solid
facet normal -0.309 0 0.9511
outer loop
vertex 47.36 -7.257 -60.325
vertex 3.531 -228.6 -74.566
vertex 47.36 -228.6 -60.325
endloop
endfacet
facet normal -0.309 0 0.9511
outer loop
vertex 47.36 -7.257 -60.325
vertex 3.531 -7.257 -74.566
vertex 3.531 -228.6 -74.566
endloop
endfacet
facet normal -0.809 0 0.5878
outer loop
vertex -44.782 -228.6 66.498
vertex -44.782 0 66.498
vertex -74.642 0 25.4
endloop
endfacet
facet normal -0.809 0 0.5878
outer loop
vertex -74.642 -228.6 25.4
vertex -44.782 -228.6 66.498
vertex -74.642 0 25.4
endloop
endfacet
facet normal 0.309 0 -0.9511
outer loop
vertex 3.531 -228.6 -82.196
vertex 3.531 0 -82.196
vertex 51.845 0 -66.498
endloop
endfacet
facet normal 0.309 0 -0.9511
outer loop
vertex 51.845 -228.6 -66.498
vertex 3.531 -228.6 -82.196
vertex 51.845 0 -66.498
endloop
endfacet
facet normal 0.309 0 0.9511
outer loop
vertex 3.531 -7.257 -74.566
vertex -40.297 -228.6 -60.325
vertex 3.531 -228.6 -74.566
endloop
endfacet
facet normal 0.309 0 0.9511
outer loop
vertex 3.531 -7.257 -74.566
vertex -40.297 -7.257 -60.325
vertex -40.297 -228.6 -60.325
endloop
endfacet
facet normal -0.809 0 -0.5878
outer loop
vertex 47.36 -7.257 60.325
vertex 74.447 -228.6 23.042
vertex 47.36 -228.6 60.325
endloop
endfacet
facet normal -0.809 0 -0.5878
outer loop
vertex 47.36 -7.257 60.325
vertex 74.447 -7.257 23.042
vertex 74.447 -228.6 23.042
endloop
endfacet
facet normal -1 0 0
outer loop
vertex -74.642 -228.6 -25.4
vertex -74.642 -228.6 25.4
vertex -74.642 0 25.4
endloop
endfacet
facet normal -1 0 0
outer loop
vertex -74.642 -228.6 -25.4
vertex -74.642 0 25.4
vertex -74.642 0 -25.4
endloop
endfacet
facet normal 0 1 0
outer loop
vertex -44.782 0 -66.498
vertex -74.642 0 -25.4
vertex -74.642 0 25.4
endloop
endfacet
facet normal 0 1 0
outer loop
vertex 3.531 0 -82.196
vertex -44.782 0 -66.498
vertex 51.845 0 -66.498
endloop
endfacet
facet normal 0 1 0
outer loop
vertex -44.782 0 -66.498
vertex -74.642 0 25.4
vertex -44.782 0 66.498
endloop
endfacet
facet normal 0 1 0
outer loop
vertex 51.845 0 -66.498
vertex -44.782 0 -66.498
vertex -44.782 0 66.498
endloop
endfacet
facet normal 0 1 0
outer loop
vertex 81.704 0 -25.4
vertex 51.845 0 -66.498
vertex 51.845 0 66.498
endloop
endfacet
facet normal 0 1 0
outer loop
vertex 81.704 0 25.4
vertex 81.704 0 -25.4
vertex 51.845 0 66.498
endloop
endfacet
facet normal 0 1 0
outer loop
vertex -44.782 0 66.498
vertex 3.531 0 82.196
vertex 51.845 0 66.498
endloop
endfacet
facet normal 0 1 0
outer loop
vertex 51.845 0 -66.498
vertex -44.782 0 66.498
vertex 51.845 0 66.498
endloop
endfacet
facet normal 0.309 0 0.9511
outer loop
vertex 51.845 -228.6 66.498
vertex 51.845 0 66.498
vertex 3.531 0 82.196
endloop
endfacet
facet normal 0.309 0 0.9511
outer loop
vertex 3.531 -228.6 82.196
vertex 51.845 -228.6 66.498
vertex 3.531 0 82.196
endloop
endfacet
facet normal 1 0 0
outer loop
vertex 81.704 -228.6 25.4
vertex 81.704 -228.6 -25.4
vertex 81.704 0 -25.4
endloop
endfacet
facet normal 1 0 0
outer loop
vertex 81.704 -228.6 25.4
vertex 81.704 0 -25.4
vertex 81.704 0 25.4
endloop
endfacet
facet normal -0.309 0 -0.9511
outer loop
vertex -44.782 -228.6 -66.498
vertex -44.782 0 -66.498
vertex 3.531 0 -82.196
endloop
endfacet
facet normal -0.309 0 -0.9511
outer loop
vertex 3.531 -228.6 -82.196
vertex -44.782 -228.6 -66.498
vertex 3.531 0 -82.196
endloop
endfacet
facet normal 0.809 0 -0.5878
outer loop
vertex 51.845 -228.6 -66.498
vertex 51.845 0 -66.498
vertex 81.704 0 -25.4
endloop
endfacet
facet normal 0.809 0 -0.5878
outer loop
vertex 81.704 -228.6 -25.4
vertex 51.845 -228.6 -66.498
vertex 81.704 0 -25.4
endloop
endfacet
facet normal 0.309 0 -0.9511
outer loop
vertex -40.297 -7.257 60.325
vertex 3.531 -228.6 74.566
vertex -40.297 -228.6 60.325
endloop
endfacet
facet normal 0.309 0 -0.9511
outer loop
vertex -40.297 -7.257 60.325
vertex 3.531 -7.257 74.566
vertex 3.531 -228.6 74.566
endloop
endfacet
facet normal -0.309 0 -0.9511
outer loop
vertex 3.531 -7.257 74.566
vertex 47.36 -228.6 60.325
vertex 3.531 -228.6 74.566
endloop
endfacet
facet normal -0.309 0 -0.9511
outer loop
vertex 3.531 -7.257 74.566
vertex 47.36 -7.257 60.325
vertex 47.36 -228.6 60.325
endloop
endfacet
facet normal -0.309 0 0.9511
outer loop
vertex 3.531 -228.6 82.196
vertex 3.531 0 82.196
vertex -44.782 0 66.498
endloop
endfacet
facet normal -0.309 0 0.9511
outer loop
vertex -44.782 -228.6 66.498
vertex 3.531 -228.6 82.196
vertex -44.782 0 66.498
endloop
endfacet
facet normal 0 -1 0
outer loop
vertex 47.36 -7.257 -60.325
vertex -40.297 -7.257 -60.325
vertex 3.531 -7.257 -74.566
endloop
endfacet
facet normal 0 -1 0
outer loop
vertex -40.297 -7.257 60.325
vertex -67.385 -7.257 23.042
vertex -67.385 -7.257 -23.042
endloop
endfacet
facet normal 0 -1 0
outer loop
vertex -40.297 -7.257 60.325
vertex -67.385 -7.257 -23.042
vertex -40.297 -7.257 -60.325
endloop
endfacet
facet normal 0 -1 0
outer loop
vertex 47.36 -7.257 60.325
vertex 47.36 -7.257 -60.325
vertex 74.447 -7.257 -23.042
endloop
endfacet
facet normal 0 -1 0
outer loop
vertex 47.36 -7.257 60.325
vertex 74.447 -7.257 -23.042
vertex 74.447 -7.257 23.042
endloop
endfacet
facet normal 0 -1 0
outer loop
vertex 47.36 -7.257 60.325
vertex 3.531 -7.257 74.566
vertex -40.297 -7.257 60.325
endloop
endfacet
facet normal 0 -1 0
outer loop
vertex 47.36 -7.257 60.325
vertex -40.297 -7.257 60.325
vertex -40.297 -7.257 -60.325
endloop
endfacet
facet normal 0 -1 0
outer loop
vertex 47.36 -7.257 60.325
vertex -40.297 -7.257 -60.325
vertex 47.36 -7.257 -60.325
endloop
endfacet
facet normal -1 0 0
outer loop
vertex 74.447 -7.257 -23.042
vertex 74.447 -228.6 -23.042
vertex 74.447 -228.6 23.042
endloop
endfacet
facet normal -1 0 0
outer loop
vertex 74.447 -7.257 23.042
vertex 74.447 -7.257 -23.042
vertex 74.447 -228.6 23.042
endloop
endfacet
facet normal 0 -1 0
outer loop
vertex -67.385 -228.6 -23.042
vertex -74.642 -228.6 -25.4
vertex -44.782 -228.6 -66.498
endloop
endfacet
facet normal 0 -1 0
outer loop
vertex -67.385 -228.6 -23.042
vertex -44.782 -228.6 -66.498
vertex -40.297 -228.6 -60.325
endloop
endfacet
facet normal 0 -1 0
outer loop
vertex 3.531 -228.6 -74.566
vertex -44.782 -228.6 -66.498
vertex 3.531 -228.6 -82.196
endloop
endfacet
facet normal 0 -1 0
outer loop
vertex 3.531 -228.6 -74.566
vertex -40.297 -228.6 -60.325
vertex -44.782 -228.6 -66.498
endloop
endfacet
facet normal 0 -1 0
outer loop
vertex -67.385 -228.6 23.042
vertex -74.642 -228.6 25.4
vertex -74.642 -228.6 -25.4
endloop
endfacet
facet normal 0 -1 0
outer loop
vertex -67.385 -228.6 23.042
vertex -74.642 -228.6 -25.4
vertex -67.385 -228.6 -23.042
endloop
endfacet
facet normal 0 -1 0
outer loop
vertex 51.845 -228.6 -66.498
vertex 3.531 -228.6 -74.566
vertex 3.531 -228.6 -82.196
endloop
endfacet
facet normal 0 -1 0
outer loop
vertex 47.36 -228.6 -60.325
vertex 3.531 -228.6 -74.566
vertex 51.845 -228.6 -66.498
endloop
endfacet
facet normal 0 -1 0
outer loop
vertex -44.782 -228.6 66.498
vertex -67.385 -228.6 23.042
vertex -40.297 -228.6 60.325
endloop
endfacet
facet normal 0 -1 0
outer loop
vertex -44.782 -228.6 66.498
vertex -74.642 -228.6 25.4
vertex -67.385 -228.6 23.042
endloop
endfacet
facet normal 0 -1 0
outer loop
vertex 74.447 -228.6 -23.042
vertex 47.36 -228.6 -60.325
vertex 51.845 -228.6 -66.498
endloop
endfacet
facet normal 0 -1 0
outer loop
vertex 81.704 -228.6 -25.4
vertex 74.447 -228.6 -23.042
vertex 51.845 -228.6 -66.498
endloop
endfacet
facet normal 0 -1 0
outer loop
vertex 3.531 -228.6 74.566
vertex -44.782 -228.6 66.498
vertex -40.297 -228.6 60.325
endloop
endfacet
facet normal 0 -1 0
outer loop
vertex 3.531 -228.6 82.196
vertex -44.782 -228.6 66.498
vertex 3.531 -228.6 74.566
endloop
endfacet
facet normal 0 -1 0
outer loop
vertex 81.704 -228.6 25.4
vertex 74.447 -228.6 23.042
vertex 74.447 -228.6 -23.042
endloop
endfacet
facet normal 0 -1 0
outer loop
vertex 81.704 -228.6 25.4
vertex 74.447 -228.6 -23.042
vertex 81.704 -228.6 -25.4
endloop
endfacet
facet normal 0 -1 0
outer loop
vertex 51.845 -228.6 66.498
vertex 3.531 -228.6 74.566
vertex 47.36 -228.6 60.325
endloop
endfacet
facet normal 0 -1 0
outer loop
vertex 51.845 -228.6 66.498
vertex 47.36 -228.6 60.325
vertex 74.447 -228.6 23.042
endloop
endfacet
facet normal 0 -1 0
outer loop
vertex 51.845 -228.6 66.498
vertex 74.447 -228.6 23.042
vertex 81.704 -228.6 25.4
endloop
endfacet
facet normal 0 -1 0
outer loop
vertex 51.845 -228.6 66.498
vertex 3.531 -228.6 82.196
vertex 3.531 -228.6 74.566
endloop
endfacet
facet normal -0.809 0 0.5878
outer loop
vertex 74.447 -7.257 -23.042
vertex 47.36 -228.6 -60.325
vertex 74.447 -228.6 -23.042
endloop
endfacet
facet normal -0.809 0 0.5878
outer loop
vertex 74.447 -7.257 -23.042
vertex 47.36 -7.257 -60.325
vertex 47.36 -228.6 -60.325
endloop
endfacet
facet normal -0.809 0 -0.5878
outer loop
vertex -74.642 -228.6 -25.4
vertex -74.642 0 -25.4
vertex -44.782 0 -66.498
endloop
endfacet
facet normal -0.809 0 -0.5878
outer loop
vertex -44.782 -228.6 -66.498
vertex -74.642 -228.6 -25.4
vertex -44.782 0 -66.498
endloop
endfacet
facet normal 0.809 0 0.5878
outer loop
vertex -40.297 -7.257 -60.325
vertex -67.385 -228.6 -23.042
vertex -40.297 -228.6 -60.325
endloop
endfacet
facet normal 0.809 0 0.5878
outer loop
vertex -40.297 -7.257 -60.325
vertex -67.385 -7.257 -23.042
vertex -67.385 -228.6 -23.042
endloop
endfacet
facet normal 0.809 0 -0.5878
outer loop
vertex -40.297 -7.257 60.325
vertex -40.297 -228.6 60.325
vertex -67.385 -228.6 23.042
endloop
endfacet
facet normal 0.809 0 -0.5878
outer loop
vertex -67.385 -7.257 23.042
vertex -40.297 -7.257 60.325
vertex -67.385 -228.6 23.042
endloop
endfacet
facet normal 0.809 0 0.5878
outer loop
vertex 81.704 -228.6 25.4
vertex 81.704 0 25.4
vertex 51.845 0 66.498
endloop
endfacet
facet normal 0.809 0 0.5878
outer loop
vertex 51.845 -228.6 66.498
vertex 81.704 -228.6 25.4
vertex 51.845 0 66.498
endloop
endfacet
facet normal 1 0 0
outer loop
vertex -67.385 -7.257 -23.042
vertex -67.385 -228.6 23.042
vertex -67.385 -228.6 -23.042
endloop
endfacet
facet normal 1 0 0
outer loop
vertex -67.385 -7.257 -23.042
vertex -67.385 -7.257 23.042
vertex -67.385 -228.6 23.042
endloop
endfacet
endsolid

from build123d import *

# Parameters (mm, degrees)
F1_DEPTH = 228.6
F2_T     = -7.257143


with BuildPart() as f1:
    # F0 (on Front) → F1 (new body)
    with BuildSketch(Plane.XZ):
        Polygon((-74.641859, 25.4), (-74.641859, -25.4), (-44.782368, -66.498063), (3.531303, -82.196127), (51.844974, -66.498063), (81.704465, -25.4), (81.704465, 25.4), (51.844974, 66.498063), (3.531303, 82.196127), (-44.782368, 66.498063), align=None)
    extrude(amount=F1_DEPTH)

    # F2
    f2_openings = [f1.faces().sort_by_distance(p)[0] for p in [
        (3.531303, -228.6, 0),
    ]]
    offset(amount=F2_T, openings=f2_openings)


solid = f1.part
